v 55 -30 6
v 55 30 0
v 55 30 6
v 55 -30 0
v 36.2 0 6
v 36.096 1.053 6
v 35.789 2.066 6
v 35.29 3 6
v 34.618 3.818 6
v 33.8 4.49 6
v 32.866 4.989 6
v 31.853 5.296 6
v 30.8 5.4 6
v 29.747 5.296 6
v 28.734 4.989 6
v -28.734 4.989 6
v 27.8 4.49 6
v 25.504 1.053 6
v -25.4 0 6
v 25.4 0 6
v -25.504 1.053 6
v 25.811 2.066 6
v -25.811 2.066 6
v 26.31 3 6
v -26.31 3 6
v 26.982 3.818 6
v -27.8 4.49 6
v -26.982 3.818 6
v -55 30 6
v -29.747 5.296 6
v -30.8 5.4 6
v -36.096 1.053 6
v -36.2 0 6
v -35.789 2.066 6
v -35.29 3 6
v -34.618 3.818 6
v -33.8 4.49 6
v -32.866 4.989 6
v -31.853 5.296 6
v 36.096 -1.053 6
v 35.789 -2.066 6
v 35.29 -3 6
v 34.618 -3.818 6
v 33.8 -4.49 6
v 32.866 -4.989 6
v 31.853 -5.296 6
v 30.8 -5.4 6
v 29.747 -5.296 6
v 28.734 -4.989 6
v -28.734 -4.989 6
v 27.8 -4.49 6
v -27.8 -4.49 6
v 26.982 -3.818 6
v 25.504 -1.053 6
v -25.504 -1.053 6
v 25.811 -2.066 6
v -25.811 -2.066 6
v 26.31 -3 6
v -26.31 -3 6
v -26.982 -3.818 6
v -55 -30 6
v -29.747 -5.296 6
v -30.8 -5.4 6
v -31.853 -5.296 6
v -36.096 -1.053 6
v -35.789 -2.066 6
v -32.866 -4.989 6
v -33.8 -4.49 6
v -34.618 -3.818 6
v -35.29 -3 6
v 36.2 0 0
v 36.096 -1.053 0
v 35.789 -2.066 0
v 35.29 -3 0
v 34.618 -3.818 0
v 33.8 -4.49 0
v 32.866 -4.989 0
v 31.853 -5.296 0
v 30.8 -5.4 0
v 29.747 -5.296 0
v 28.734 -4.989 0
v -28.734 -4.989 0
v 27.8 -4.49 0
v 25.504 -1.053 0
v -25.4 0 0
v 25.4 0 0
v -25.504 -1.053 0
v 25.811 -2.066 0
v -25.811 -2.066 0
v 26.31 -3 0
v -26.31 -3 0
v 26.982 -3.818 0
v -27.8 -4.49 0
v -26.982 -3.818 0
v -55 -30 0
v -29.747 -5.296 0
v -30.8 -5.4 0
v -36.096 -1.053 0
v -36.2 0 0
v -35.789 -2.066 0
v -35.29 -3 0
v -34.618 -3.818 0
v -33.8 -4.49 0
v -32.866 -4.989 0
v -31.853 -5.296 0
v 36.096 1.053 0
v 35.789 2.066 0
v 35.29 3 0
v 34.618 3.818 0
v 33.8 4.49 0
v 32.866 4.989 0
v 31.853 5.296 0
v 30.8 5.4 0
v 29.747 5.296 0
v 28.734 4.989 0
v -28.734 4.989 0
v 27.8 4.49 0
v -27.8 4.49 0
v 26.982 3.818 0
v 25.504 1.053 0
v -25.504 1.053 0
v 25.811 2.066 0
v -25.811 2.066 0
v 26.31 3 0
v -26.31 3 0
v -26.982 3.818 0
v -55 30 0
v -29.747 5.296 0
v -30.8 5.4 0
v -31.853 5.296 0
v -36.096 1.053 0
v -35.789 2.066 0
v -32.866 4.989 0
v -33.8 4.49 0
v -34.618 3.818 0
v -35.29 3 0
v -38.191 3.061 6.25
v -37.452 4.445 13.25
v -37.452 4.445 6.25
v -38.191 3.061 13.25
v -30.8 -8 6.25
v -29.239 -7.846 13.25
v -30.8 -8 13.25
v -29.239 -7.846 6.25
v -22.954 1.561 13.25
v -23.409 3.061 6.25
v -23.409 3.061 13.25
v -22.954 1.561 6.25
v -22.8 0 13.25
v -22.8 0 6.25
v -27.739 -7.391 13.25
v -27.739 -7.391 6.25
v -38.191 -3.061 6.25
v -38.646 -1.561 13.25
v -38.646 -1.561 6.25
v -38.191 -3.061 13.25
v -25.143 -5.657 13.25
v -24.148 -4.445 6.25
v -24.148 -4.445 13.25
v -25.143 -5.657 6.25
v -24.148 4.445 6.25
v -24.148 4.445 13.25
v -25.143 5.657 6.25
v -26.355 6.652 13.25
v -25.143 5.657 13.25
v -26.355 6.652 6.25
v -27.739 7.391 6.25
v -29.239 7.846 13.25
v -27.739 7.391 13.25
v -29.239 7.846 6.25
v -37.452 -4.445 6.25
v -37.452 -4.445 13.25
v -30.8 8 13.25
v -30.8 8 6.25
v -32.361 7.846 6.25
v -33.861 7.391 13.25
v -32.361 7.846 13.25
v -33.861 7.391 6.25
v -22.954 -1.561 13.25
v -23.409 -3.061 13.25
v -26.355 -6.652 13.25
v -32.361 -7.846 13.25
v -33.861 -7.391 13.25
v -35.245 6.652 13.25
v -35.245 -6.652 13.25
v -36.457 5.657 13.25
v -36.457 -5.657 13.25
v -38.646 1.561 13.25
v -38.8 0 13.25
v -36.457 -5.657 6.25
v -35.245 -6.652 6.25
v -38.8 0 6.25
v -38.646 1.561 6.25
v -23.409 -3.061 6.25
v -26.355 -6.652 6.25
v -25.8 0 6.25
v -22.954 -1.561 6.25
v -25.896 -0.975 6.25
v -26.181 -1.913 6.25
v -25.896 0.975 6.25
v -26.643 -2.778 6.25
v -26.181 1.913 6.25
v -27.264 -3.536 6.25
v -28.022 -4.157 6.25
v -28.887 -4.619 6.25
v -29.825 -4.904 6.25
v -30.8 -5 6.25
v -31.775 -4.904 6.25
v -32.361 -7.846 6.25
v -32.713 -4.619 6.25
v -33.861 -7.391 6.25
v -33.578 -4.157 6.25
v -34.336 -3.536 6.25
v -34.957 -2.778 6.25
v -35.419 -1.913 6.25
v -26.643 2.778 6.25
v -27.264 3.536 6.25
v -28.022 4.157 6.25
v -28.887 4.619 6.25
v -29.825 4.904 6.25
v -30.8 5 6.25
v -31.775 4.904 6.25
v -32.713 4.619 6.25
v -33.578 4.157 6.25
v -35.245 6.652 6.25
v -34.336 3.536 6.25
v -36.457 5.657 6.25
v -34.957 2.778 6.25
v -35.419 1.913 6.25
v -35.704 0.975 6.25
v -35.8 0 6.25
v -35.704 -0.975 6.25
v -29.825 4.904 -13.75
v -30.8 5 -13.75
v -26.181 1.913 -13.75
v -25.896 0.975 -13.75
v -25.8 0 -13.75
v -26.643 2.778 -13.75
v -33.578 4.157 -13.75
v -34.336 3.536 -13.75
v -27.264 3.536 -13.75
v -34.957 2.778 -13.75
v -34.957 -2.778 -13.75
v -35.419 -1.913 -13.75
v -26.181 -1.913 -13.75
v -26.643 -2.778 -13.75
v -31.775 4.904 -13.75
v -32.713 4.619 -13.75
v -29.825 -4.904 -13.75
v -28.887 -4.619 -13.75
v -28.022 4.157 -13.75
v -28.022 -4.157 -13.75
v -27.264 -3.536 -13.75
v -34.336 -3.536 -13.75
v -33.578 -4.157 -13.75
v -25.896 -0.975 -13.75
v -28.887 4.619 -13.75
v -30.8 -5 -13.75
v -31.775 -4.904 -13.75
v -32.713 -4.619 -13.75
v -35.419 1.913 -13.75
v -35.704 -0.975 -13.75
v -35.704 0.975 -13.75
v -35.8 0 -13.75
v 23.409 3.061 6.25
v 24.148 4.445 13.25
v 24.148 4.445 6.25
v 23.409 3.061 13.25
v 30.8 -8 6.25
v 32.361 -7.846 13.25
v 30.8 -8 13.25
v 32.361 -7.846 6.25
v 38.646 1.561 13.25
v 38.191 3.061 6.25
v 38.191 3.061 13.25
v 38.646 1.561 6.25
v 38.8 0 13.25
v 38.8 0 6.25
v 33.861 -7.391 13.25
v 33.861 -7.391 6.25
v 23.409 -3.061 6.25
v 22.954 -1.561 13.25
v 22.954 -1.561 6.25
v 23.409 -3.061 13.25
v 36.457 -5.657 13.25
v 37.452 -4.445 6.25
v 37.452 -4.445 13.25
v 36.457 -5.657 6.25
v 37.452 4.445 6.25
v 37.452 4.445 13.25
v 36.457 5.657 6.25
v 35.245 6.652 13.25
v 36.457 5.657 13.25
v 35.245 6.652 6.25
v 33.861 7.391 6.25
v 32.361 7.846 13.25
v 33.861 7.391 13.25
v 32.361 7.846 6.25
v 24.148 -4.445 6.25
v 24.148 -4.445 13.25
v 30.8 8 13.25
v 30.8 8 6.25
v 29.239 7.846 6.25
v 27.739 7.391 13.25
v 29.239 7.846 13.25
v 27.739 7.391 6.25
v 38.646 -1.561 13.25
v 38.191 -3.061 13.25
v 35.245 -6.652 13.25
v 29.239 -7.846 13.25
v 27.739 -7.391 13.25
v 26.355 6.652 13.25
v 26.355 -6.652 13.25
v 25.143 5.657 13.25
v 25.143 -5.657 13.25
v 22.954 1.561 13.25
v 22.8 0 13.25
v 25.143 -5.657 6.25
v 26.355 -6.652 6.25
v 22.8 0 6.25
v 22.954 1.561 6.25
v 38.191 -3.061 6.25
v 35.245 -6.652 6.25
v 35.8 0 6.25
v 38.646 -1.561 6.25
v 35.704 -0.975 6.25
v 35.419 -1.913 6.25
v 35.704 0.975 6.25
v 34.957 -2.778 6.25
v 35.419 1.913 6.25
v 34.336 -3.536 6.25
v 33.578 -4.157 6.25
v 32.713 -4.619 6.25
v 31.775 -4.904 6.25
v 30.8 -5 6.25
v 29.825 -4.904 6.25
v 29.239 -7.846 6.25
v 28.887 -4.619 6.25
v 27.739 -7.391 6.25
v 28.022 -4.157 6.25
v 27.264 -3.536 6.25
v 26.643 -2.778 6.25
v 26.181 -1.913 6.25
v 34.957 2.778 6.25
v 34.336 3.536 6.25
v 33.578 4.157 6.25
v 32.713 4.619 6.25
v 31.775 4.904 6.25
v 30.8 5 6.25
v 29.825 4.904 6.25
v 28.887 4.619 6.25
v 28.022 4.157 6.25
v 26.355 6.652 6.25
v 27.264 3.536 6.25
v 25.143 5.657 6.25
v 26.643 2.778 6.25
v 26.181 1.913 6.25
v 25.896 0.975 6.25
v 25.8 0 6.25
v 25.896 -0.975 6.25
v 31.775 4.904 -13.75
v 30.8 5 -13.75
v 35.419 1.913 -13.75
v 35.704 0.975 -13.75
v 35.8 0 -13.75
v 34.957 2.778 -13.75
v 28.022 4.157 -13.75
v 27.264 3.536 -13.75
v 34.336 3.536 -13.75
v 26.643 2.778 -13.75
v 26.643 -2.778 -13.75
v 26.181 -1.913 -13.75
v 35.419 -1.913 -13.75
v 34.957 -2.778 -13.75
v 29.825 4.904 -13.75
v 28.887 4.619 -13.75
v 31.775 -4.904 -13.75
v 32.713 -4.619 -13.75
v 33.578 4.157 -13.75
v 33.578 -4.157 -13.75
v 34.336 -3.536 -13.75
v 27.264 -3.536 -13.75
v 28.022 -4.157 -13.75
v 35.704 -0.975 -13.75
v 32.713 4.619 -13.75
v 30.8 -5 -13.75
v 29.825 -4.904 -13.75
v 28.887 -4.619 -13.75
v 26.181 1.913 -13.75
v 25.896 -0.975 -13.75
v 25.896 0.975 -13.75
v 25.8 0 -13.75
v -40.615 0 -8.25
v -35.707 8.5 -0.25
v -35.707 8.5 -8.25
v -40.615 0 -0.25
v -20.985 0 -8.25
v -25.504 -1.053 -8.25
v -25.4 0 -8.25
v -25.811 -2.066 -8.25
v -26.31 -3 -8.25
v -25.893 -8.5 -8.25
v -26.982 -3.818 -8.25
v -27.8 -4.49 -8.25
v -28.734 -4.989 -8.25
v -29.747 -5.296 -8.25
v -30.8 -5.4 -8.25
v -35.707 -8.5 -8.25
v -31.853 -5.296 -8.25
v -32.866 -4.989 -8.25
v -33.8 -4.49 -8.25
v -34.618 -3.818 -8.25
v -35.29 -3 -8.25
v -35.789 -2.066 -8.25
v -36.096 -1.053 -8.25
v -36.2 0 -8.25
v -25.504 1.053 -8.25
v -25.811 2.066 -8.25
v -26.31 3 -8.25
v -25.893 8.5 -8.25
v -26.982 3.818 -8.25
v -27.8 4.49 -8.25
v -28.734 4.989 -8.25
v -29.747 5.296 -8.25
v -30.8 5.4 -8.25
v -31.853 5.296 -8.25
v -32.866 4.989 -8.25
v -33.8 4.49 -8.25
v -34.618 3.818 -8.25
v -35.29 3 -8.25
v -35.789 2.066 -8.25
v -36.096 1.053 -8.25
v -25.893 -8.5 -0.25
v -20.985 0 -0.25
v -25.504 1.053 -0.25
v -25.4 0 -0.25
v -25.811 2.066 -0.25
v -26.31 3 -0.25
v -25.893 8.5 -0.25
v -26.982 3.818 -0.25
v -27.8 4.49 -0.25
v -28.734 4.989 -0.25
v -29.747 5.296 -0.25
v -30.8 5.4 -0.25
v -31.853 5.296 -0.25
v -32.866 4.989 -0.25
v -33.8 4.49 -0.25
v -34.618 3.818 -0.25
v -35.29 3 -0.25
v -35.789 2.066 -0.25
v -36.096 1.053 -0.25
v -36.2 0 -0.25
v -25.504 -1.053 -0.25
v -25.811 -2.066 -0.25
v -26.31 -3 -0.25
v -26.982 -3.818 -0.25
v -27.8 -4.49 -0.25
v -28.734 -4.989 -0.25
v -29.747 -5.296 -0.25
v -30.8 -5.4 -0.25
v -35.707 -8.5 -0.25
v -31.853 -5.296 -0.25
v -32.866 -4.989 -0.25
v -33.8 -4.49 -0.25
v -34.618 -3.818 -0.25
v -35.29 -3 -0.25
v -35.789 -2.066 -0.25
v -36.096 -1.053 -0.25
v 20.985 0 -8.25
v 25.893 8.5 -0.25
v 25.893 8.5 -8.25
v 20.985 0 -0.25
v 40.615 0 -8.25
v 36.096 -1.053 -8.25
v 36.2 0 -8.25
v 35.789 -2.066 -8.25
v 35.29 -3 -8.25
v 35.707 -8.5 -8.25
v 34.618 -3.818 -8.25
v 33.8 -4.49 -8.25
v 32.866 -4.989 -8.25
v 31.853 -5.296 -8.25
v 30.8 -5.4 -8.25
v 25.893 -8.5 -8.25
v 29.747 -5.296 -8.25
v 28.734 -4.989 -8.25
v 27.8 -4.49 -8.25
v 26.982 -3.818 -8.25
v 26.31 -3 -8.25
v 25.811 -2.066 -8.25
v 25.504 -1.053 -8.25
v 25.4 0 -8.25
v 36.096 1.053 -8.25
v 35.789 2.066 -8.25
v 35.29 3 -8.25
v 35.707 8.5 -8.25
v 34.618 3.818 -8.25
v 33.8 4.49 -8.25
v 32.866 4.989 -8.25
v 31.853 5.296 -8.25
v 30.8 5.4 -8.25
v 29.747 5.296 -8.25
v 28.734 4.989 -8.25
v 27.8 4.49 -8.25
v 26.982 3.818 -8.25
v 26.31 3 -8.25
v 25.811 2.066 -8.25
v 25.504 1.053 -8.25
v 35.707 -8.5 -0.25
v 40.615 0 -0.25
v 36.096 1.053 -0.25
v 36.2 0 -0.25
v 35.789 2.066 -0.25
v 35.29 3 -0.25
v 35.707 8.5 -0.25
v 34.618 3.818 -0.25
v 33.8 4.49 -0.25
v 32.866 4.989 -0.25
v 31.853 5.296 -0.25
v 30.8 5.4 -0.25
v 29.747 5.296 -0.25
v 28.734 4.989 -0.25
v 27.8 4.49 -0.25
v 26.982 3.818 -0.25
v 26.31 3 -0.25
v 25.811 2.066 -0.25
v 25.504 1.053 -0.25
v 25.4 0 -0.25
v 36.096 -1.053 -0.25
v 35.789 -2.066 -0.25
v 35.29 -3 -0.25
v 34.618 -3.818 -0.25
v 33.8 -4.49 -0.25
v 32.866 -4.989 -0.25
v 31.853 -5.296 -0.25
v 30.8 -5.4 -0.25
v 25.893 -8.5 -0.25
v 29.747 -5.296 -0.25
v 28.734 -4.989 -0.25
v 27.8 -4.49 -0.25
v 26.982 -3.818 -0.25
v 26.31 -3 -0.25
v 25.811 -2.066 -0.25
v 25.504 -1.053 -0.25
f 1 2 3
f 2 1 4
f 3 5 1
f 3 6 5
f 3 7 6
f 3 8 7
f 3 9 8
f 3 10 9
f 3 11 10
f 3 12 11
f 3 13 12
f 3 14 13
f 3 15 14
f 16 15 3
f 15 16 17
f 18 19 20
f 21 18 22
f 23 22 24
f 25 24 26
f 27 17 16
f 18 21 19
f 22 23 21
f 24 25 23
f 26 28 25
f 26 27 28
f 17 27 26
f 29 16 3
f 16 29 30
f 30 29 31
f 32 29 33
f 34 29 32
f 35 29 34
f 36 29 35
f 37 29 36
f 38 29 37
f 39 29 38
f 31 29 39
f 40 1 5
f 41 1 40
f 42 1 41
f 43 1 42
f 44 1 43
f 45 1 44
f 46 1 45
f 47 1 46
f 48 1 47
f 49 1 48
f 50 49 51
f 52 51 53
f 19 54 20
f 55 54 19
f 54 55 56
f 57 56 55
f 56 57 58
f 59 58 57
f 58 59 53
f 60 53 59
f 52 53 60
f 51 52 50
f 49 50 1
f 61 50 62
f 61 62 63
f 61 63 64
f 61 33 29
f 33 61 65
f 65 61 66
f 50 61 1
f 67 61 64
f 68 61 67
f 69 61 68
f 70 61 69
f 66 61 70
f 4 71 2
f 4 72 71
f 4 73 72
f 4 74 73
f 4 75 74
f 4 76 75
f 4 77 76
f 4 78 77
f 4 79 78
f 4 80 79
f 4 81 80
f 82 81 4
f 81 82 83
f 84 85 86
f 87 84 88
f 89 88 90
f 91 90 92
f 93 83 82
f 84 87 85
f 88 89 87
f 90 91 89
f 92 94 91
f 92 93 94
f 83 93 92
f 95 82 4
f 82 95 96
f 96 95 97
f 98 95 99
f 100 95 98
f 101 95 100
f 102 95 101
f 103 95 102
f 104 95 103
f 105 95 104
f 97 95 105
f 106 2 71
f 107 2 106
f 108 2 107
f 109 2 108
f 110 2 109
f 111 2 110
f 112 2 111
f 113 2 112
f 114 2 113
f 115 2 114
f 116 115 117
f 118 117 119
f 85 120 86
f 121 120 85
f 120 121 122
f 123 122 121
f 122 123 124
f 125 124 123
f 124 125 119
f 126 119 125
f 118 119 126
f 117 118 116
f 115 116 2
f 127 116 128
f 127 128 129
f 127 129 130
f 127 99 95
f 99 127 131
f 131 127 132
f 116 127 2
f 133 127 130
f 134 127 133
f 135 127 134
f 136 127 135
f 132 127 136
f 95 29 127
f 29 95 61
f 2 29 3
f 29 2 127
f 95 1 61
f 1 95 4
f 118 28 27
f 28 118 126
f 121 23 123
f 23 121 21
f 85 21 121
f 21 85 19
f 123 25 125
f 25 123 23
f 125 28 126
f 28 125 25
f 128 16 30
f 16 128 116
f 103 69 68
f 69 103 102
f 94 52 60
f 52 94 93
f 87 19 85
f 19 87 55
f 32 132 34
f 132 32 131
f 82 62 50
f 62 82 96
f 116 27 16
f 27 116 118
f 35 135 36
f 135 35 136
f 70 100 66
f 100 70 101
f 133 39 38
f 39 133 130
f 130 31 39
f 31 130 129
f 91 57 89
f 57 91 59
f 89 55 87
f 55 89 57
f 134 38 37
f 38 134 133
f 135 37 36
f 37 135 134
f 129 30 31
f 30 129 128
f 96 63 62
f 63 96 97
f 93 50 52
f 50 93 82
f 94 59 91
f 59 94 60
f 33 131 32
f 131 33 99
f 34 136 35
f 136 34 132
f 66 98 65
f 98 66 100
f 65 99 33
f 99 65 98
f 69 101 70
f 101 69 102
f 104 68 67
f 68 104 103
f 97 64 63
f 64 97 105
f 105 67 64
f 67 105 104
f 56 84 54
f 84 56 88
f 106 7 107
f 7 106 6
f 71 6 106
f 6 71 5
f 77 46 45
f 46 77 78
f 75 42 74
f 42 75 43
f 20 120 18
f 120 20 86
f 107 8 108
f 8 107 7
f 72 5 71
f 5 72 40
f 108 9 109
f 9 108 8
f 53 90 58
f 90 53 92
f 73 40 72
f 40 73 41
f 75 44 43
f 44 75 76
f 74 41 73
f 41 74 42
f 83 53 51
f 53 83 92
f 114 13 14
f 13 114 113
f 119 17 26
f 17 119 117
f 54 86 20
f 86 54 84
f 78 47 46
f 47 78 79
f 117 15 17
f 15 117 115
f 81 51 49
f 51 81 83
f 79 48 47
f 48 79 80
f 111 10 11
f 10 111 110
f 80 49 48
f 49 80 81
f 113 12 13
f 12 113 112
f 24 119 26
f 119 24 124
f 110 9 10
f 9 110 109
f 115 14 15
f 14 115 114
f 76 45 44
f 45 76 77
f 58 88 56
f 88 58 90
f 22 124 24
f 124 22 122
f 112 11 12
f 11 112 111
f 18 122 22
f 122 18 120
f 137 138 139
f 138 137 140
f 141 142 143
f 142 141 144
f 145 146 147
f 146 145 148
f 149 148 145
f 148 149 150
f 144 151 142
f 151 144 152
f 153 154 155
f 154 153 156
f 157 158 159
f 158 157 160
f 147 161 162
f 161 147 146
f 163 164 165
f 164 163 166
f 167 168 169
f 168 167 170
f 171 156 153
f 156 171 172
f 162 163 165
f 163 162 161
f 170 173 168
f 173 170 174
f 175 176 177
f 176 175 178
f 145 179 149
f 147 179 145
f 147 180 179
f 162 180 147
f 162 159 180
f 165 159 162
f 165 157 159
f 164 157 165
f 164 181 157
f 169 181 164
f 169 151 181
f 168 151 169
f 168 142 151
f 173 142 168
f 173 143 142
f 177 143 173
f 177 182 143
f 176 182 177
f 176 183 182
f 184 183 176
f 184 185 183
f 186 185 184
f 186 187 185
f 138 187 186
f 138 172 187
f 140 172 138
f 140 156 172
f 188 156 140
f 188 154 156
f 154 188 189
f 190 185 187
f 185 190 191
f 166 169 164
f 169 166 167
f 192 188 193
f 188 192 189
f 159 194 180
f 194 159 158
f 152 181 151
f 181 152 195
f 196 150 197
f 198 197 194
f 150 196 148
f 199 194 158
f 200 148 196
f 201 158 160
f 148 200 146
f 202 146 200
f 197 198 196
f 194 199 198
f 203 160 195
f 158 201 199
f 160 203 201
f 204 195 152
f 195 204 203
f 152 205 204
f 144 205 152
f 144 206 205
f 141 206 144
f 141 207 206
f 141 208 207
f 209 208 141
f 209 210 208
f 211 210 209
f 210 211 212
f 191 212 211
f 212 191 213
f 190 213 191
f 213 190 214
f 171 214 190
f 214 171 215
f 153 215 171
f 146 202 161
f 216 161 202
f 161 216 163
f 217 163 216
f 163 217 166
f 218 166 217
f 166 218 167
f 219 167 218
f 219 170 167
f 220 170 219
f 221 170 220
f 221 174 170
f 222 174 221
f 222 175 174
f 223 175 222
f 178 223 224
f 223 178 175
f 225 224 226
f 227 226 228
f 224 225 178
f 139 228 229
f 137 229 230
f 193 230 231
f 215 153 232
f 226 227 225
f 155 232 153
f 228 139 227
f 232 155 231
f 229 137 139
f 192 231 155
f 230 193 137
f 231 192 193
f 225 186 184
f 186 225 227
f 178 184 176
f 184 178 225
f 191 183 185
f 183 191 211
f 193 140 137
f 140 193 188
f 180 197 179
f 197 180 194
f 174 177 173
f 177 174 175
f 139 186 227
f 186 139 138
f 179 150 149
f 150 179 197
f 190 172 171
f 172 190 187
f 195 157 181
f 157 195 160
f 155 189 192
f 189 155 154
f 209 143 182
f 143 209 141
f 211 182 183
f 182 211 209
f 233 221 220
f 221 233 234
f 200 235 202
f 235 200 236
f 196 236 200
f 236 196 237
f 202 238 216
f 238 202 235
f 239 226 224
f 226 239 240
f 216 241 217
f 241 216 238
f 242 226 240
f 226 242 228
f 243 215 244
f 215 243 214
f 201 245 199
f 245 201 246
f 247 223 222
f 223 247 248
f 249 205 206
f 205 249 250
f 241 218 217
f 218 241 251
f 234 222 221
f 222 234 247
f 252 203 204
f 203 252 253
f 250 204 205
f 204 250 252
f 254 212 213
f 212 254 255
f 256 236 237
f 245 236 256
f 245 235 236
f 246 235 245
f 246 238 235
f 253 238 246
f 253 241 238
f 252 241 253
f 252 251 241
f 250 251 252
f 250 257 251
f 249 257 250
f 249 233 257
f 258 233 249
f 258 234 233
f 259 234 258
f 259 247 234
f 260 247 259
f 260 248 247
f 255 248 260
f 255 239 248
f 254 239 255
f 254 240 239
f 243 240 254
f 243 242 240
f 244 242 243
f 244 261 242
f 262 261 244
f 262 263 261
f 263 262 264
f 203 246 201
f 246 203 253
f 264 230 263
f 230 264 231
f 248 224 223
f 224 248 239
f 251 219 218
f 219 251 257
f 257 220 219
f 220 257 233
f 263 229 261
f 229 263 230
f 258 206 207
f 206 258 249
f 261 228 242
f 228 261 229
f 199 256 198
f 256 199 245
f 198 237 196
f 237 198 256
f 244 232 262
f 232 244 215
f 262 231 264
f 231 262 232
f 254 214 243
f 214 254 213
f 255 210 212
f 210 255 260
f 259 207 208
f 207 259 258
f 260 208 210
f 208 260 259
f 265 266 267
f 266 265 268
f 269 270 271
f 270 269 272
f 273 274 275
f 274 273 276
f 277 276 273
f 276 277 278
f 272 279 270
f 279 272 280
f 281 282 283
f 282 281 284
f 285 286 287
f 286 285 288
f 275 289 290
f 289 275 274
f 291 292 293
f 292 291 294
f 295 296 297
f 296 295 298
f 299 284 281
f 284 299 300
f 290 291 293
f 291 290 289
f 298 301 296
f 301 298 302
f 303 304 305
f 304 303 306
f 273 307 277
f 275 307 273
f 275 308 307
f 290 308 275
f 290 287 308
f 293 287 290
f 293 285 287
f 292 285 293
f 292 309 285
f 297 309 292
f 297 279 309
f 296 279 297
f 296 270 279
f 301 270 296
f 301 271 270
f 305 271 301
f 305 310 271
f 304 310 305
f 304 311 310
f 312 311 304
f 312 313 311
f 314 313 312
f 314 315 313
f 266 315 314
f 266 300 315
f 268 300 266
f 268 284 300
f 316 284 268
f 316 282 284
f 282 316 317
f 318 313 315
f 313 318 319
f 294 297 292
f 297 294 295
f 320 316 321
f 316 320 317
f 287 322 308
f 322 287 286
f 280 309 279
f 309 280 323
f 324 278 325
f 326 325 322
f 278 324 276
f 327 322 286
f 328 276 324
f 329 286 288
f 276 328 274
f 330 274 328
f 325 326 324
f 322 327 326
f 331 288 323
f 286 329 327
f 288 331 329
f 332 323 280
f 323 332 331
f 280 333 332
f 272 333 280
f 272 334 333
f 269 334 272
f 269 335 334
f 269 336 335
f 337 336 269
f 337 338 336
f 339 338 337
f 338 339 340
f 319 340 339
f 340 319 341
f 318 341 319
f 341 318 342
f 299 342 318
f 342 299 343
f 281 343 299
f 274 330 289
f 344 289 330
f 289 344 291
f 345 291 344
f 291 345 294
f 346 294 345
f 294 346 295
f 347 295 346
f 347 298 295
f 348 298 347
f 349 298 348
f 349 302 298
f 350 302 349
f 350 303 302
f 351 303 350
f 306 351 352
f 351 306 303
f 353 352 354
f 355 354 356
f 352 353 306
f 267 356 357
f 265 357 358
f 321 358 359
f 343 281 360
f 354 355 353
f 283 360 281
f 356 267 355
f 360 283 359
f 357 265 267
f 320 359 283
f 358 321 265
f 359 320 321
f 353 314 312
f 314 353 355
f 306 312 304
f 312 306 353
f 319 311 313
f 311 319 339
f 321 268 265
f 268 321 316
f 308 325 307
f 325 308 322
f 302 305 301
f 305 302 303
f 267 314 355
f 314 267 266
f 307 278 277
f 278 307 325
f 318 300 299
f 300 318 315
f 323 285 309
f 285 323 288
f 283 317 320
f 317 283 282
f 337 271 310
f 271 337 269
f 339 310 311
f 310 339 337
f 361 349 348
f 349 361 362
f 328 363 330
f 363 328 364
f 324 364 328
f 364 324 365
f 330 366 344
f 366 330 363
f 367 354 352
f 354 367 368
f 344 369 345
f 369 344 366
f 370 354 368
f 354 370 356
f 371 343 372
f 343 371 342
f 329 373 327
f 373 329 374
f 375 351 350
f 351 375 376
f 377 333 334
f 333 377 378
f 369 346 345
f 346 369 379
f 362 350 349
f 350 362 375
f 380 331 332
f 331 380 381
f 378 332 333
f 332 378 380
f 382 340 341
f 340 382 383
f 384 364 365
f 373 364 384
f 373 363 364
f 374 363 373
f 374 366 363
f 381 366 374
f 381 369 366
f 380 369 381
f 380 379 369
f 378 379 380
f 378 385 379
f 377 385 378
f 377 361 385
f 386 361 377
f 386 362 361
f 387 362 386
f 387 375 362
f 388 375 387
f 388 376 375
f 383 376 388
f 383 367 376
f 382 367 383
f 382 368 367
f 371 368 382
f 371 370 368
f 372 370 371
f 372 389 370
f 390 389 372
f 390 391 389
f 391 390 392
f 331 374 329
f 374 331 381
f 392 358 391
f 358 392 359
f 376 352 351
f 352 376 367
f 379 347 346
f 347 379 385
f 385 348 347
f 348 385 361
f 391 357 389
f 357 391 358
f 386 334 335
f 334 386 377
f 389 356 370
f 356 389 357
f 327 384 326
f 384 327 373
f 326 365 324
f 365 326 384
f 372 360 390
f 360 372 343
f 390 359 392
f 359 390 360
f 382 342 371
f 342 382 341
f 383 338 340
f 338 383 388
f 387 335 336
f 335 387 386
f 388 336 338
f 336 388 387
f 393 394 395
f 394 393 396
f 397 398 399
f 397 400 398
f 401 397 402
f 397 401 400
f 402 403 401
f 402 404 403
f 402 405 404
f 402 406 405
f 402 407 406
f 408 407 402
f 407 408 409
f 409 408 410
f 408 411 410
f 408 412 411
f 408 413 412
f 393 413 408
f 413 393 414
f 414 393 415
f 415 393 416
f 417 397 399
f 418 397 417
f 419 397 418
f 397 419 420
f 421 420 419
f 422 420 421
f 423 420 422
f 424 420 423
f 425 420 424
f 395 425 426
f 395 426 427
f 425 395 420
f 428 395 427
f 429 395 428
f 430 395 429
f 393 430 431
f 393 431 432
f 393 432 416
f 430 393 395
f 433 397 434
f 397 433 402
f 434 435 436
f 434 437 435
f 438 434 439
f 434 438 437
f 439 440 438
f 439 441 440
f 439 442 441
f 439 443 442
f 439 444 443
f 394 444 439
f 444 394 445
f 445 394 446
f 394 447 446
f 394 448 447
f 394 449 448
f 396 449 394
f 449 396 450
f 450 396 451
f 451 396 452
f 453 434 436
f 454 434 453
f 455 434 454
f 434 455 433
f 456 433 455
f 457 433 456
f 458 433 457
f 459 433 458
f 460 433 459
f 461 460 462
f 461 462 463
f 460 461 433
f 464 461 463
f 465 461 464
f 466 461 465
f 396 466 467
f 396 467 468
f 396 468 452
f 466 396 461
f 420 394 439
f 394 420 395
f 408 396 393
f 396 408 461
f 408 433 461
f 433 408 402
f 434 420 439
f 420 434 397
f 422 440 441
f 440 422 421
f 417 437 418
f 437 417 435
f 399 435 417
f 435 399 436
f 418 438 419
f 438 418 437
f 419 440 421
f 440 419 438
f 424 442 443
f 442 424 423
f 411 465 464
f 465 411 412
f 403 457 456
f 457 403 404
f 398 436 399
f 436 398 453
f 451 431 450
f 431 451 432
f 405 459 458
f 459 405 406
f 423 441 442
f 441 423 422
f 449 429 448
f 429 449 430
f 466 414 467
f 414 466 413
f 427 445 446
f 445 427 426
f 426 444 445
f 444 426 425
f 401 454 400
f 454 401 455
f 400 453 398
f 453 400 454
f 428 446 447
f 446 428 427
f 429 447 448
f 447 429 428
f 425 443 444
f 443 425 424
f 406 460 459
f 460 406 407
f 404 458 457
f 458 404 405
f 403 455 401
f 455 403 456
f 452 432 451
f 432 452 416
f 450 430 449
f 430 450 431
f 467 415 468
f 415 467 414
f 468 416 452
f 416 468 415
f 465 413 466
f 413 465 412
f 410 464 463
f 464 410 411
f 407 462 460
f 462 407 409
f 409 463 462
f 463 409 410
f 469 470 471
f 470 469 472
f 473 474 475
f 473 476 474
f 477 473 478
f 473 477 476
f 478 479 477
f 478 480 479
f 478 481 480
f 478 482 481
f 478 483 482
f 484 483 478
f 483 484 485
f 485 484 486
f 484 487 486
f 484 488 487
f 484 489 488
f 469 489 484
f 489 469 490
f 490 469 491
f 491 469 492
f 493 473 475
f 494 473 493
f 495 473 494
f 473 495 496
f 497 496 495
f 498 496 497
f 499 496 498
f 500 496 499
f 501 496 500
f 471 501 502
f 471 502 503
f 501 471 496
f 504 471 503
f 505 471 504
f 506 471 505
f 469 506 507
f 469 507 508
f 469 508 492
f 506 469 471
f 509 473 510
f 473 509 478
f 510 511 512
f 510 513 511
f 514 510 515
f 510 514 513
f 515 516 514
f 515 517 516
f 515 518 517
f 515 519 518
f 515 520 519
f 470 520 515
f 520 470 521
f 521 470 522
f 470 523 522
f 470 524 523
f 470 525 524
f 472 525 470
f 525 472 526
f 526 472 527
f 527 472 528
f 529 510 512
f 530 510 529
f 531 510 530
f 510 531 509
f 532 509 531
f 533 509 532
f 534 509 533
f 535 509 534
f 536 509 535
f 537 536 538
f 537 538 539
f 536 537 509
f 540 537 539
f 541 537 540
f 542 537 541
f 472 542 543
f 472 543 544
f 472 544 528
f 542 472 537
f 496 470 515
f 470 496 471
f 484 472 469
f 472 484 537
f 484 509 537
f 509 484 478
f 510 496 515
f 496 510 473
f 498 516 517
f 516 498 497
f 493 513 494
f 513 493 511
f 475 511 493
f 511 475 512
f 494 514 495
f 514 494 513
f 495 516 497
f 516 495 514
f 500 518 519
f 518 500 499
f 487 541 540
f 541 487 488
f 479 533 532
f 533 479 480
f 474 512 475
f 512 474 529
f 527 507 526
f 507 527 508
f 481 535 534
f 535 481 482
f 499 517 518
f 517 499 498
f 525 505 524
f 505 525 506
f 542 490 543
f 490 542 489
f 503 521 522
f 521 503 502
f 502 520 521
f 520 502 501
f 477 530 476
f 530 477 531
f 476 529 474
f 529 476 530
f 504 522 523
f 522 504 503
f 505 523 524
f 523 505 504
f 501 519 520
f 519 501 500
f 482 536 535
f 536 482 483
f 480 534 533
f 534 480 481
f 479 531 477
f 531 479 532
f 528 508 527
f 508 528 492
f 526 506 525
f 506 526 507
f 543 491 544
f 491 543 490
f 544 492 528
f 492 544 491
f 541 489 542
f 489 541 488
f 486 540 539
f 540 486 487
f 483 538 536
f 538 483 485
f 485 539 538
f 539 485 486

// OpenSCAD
$fn = 32;

// ------------------------------------------------------------------------
// Bolted plate: 110 x 60 x 6 mm plate, 2 fasteners
// Every part is its own module, assembly() places them once.
// ------------------------------------------------------------------------

// --- part 1 ---
module plate() {
  difference() {
    translate([-55, -30, 0]) cube([110, 60, 6]);
    translate([-30.8, 0, -1]) cylinder(h = 8, d = 10.8);
    translate([30.8, 0, -1]) cylinder(h = 8, d = 10.8);
  }
}

// --- part 2 ---
module bolt1() {
  cylinder(h = 7, d = 16);
  translate([0, 0, -20]) cylinder(h = 20, d = 10);
}

// --- part 3 ---
module bolt2() {
  cylinder(h = 7, d = 16);
  translate([0, 0, -20]) cylinder(h = 20, d = 10);
}

// --- part 4 ---
module nut1() {
  difference() {
    linear_extrude(height = 8) polygon(points = [[9.815, 0], [4.907, 8.5], [-4.907, 8.5], [-9.815, 0], [-4.907, -8.5], [4.907, -8.5]]);
    translate([0, 0, -1]) cylinder(h = 10, d = 10.8);
  }
}

// --- part 5 ---
module nut2() {
  difference() {
    linear_extrude(height = 8) polygon(points = [[9.815, 0], [4.907, 8.5], [-4.907, 8.5], [-9.815, 0], [-4.907, -8.5], [4.907, -8.5]]);
    translate([0, 0, -1]) cylinder(h = 10, d = 10.8);
  }
}

// --- assembly ---
module assembly() {
  translate([0, 0, 0]) rotate([0, 0, 0]) plate();
  translate([-30.8, 0, 6.25]) rotate([0, 0, 0]) bolt1();
  translate([30.8, 0, 6.25]) rotate([0, 0, 0]) bolt2();
  translate([-30.8, 0, -8.25]) rotate([0, 0, 0]) nut1();
  translate([30.8, 0, -8.25]) rotate([0, 0, 0]) nut2();
}

assembly();
